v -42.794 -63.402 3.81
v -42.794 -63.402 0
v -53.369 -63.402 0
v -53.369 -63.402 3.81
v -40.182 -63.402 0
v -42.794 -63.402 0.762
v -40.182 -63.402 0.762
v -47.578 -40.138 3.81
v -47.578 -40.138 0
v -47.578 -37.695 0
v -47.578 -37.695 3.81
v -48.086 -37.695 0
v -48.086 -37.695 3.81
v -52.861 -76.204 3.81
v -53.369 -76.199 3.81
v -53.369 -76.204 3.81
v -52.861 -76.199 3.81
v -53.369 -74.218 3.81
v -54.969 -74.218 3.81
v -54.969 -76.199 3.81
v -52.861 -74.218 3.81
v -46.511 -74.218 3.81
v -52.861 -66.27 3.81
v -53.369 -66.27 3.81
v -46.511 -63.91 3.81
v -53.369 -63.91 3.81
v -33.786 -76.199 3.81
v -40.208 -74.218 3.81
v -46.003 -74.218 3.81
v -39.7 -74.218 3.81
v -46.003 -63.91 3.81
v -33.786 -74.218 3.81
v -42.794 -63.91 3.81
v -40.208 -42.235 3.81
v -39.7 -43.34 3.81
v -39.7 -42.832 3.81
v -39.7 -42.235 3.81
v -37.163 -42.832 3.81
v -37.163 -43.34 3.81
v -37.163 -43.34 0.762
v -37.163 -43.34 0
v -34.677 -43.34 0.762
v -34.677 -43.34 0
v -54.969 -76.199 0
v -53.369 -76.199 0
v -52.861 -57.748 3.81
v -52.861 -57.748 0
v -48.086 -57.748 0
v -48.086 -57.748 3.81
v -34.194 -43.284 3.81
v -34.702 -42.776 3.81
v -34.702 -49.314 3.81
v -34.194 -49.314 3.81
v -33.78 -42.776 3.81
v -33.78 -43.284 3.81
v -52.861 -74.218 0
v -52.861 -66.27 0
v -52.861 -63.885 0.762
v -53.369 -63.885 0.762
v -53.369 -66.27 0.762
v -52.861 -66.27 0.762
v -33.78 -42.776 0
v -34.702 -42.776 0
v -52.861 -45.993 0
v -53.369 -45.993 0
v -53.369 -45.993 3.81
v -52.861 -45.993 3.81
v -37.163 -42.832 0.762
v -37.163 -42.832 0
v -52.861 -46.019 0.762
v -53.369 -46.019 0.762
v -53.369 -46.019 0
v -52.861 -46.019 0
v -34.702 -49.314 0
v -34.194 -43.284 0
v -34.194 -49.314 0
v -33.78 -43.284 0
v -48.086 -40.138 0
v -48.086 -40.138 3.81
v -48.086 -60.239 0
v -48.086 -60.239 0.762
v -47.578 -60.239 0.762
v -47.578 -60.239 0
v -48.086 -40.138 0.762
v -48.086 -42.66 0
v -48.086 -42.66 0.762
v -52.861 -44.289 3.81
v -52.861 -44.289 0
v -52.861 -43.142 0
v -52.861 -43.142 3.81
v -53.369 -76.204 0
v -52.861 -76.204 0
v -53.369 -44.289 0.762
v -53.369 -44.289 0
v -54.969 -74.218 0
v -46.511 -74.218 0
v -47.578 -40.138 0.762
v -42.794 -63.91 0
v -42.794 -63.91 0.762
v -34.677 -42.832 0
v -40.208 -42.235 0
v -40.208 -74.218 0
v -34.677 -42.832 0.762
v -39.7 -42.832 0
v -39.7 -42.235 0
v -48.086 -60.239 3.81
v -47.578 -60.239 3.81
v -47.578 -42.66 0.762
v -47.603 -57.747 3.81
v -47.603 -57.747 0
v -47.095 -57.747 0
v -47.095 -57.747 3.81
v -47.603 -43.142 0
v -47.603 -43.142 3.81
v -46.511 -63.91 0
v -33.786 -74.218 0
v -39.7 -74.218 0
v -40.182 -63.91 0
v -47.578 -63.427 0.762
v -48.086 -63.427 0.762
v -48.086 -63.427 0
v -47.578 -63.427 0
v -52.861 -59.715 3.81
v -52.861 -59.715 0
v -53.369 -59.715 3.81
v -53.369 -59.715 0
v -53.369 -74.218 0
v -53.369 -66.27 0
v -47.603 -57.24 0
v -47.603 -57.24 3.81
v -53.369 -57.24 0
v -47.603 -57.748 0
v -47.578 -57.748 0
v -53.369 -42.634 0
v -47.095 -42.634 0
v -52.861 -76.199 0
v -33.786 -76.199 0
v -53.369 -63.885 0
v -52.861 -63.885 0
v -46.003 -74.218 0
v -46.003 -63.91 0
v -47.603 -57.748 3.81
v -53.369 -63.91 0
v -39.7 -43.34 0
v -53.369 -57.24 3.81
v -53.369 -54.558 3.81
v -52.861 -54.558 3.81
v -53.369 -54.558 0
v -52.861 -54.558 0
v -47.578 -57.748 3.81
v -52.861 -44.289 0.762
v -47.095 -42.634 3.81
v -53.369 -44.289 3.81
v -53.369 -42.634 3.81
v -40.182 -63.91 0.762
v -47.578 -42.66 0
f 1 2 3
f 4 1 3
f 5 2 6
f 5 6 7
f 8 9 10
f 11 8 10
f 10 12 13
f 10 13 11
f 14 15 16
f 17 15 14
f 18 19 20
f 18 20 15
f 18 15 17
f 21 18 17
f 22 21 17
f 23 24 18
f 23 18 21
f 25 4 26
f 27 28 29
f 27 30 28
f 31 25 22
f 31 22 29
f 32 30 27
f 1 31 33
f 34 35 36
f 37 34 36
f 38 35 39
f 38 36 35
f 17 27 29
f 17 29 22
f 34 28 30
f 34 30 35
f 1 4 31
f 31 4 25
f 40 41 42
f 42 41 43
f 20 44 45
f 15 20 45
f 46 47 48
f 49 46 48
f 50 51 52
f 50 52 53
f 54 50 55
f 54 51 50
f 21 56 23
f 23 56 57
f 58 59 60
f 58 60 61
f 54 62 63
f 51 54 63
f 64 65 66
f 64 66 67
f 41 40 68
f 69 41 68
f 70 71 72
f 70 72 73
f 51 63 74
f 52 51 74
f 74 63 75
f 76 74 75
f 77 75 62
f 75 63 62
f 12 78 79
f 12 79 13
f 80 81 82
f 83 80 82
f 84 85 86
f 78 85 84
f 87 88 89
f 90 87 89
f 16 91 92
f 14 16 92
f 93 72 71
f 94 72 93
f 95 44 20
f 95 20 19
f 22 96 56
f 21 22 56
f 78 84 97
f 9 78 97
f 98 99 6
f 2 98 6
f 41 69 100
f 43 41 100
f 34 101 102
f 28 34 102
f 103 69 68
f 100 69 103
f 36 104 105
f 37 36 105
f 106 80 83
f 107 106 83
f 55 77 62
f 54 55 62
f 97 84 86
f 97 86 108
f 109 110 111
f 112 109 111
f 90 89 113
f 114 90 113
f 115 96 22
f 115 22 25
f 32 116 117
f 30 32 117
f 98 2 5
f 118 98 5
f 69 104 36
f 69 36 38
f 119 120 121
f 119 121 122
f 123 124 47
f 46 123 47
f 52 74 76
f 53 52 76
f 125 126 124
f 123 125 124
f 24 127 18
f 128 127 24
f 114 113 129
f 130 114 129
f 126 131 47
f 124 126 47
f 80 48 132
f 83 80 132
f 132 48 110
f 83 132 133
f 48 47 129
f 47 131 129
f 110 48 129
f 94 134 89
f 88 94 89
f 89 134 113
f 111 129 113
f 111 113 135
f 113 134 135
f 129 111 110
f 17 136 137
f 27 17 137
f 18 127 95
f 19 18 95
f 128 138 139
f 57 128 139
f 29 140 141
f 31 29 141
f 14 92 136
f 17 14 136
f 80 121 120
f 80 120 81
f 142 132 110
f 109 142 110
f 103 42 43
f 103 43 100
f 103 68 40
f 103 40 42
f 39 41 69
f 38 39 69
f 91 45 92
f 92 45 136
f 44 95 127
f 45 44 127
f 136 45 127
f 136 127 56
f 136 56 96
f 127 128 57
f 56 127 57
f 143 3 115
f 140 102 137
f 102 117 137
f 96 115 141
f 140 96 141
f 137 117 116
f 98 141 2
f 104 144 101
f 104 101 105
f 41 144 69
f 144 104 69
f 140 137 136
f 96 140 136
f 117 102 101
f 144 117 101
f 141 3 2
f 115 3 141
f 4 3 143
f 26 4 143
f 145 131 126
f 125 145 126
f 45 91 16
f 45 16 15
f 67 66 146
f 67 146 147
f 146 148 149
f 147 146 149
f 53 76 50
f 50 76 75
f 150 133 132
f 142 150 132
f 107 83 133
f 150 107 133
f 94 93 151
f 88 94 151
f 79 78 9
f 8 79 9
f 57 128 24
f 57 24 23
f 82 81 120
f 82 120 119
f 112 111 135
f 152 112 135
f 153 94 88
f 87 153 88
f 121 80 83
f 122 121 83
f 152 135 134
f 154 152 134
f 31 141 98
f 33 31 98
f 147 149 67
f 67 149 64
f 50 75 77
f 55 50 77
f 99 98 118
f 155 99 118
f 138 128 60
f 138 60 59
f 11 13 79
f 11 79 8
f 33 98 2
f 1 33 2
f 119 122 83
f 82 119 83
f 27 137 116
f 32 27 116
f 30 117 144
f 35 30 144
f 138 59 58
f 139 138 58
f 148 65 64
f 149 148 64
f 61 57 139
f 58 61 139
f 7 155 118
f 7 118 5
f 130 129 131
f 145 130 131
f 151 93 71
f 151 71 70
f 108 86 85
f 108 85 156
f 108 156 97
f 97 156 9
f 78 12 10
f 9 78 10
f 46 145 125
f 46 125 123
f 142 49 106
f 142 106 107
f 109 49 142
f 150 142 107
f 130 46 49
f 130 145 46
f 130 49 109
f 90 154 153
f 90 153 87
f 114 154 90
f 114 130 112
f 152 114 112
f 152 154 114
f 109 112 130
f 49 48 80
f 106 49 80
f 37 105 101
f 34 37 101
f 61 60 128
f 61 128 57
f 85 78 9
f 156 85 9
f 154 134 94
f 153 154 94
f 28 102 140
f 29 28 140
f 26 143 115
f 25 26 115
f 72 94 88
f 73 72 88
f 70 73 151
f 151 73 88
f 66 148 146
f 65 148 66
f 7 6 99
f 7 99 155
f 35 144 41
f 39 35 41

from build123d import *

# Parameters (mm, degrees)
F0_W     = 0.508
F0_H     = 2.4421113945
F1_DEPTH = 3.81
F0_W_2   = 1.6002
F0_H_2   = 1.9812
F0_W_3   = 0.0002247308
F0_H_3   = 7.948144058
F0_H_4   = 0.0054016709
F0_H_5   = 1.9428965652
F0_H_6   = 10.3078993953
F0_H_7   = 1.9640636646
F0_W_4   = 2.5370969934
F0_H_8   = 0.508
F0_W_5   = 0.0054331414
F0_H_9   = 6.0304999352
F0_H_10  = 8.5650607944
F0_H_11  = 1.1464767158
F0_H_12  = 1.9664727151
F2_W     = 0.508
F2_H     = 3.1881572
F3_DEPTH = 0.762
F2_H_2   = 2.3851616
F2_W_2   = 2.6121868
F2_H_3   = 0.508
F2_W_3   = 2.4860504
F2_H_4   = 1.7296638
F2_H_5   = 2.5223724


# Not quite as in the source:
# - ends of sketch curves that miss each other by under 0.0002 mm in the source are joined


with BuildPart() as f1:
    # F0 (on Top) → F1 (new body)
    with BuildSketch(Plane.XY):
        with Locations((-47.8317493596, -38.9164811265)):
            Rectangle(F0_W, F0_H)
    extrude(amount=F1_DEPTH)


with BuildPart() as f1b:
    # F0 (on Top) → F1, piece 2 (new body)
    with BuildSketch(Plane.XY):
        with Locations((-54.1690493596, -75.2084621686)):
            Rectangle(F0_W_2, F0_H_2)
        with Locations((-54.969261725, -75.2084621686)):
            Rectangle(F0_W_3, F0_H_2)
        with Locations((-53.1149493596, -75.2084621686)):
            Rectangle(F0_W, F0_H_2)
        with Locations((-53.1149493596, -70.2437901396)):
            Rectangle(F0_W, F0_H_3)
        with Locations((-53.1149493596, -76.2017630041)):
            Rectangle(F0_W, F0_H_4)
        Polygon((-46.5109493596, -74.2178621686), (-52.8609493596, -74.2178621686), (-52.8609493596, -76.1990621686), (-33.7857740904, -76.1990621686), (-33.7857740904, -74.2178621686), (-39.6996169848, -74.2178621686), (-39.6996169848, -76.1819258332), (-40.2076169848, -76.1819258332), (-40.2076169848, -74.2178621686), (-46.0029493596, -74.2178621686), (-46.0029493596, -76.1607587337), (-46.5109493596, -76.1607587337), align=None)
        with Locations((-46.2569493596, -75.1893104512)):
            Rectangle(F0_W, F0_H_5)
        with Locations((-46.2569493596, -69.063912471)):
            Rectangle(F0_W, F0_H_6)
        Polygon((-53.3689493596, -63.9099627733), (-46.5109493596, -63.9099627733), (-46.0029493596, -63.9099627733), (-42.7943961977, -63.9099627733), (-42.7943961977, -63.4019627733), (-53.3689493596, -63.4019627733), align=None)
        with Locations((-39.9536169848, -75.1998940009)):
            Rectangle(F0_W, F0_H_7)
        Polygon((-40.2076169848, -42.2351099551), (-40.2076169848, -74.2178621686), (-39.6996169848, -74.2178621686), (-39.6996169848, -43.3401577175), (-39.6996169848, -42.8321577175), (-39.6996169848, -42.2351099551), align=None)
        with Locations((-38.4310684881, -43.0861577175)):
            Rectangle(F0_W_4, F0_H_8)
    extrude(amount=F1_DEPTH)


with BuildPart() as f1c:
    # F0 (on Top) → F1, piece 3 (new body)
    with BuildSketch(Plane.XY):
        with Locations((-33.7828327889, -43.0298909328)):
            Rectangle(F0_W_5, F0_H_8)
        Polygon((-33.7855493596, -43.2838909328), (-33.7855493596, -42.7758909328), (-34.7018577158, -42.7758909328), (-34.7018577158, -43.2838909328), (-34.1938577158, -43.2838909328), align=None)
        with Locations((-34.4478577158, -46.2991409004)):
            Rectangle(F0_W, F0_H_9)
    extrude(amount=F1_DEPTH)


with BuildPart() as f1d:
    # F0 (on Top) → F1, piece 4 (new body)
    with BuildSketch(Plane.XY):
        with Locations((-53.1149493596, -50.2757765353)):
            Rectangle(F0_W, F0_H_10)
    extrude(amount=F1_DEPTH)


with BuildPart() as f1e:
    # F0 (on Top) → F1, piece 5 (new body)
    with BuildSketch(Plane.XY):
        Polygon((-47.0951493596, -57.7474975395), (-47.0951493596, -42.6344975395), (-47.6031493596, -42.6344975395), (-47.6031493596, -43.1424975395), (-47.6031493596, -57.2403549714), (-47.6031493596, -57.7474975395), align=None)
        Polygon((-47.6031493596, -43.1424975395), (-47.6031493596, -42.6344975395), (-53.3689493596, -42.6344975395), (-53.3689493596, -43.1424975395), (-52.8609493596, -43.1424975395), align=None)
        Polygon((-47.6031493596, -57.7483549714), (-47.6031493596, -57.7474975395), (-47.6031493596, -57.2403549714), (-53.3689493596, -57.2403549714), (-53.3689493596, -57.7483549714), (-52.8609493596, -57.7483549714), (-48.0857493596, -57.7483549714), align=None)
        with Locations((-53.1149493596, -43.7157358974)):
            Rectangle(F0_W, F0_H_11)
        Polygon((-47.5777493596, -57.7483549714), (-47.6031493596, -57.7483549714), (-48.0857493596, -57.7483549714), (-48.0857493596, -60.2392181754), (-47.5777493596, -60.2392181754), align=None)
        with Locations((-53.1149493596, -58.731591329)):
            Rectangle(F0_W, F0_H_12)
    extrude(amount=F1_DEPTH)


with BuildPart() as f3:
    # F2 (on Top) → F3 (new body)
    with BuildSketch(Plane.XY):
        with Locations((-47.8317679776, -61.8332334061)):
            Rectangle(F2_W, F2_H)
    extrude(amount=F3_DEPTH)


with BuildPart() as f3b:
    # F2 (on Top) → F3, piece 2 (new body)
    with BuildSketch(Plane.XY):
        with Locations((-53.1151176414, -65.0771501798)):
            Rectangle(F2_W, F2_H_2)
    extrude(amount=F3_DEPTH)


with BuildPart() as f3c:
    # F2 (on Top) → F3, piece 3 (new body)
    with BuildSketch(Plane.XY):
        with Locations((-41.4881832206, -63.6563040937)):
            Rectangle(F2_W_2, F2_H_3)
    extrude(amount=F3_DEPTH)


with BuildPart() as f3d:
    # F2 (on Top) → F3, piece 4 (new body)
    with BuildSketch(Plane.XY):
        with Locations((-35.9195275606, -43.086094628)):
            Rectangle(F2_W_3, F2_H_3)
    extrude(amount=F3_DEPTH)


with BuildPart() as f3e:
    # F2 (on Top) → F3, piece 5 (new body)
    with BuildSketch(Plane.XY):
        with Locations((-53.1148813448, -45.1537201351)):
            Rectangle(F2_W, F2_H_4)
    extrude(amount=F3_DEPTH)


with BuildPart() as f3f:
    # F2 (on Top) → F3, piece 6 (new body)
    with BuildSketch(Plane.XY):
        with Locations((-47.8318013034, -41.398733509)):
            Rectangle(F2_W, F2_H_5)
    extrude(amount=F3_DEPTH)


solid = Compound([f1.part, f1b.part, f1c.part, f1d.part, f1e.part, f3.part, f3b.part, f3c.part, f3d.part, f3e.part, f3f.part])
